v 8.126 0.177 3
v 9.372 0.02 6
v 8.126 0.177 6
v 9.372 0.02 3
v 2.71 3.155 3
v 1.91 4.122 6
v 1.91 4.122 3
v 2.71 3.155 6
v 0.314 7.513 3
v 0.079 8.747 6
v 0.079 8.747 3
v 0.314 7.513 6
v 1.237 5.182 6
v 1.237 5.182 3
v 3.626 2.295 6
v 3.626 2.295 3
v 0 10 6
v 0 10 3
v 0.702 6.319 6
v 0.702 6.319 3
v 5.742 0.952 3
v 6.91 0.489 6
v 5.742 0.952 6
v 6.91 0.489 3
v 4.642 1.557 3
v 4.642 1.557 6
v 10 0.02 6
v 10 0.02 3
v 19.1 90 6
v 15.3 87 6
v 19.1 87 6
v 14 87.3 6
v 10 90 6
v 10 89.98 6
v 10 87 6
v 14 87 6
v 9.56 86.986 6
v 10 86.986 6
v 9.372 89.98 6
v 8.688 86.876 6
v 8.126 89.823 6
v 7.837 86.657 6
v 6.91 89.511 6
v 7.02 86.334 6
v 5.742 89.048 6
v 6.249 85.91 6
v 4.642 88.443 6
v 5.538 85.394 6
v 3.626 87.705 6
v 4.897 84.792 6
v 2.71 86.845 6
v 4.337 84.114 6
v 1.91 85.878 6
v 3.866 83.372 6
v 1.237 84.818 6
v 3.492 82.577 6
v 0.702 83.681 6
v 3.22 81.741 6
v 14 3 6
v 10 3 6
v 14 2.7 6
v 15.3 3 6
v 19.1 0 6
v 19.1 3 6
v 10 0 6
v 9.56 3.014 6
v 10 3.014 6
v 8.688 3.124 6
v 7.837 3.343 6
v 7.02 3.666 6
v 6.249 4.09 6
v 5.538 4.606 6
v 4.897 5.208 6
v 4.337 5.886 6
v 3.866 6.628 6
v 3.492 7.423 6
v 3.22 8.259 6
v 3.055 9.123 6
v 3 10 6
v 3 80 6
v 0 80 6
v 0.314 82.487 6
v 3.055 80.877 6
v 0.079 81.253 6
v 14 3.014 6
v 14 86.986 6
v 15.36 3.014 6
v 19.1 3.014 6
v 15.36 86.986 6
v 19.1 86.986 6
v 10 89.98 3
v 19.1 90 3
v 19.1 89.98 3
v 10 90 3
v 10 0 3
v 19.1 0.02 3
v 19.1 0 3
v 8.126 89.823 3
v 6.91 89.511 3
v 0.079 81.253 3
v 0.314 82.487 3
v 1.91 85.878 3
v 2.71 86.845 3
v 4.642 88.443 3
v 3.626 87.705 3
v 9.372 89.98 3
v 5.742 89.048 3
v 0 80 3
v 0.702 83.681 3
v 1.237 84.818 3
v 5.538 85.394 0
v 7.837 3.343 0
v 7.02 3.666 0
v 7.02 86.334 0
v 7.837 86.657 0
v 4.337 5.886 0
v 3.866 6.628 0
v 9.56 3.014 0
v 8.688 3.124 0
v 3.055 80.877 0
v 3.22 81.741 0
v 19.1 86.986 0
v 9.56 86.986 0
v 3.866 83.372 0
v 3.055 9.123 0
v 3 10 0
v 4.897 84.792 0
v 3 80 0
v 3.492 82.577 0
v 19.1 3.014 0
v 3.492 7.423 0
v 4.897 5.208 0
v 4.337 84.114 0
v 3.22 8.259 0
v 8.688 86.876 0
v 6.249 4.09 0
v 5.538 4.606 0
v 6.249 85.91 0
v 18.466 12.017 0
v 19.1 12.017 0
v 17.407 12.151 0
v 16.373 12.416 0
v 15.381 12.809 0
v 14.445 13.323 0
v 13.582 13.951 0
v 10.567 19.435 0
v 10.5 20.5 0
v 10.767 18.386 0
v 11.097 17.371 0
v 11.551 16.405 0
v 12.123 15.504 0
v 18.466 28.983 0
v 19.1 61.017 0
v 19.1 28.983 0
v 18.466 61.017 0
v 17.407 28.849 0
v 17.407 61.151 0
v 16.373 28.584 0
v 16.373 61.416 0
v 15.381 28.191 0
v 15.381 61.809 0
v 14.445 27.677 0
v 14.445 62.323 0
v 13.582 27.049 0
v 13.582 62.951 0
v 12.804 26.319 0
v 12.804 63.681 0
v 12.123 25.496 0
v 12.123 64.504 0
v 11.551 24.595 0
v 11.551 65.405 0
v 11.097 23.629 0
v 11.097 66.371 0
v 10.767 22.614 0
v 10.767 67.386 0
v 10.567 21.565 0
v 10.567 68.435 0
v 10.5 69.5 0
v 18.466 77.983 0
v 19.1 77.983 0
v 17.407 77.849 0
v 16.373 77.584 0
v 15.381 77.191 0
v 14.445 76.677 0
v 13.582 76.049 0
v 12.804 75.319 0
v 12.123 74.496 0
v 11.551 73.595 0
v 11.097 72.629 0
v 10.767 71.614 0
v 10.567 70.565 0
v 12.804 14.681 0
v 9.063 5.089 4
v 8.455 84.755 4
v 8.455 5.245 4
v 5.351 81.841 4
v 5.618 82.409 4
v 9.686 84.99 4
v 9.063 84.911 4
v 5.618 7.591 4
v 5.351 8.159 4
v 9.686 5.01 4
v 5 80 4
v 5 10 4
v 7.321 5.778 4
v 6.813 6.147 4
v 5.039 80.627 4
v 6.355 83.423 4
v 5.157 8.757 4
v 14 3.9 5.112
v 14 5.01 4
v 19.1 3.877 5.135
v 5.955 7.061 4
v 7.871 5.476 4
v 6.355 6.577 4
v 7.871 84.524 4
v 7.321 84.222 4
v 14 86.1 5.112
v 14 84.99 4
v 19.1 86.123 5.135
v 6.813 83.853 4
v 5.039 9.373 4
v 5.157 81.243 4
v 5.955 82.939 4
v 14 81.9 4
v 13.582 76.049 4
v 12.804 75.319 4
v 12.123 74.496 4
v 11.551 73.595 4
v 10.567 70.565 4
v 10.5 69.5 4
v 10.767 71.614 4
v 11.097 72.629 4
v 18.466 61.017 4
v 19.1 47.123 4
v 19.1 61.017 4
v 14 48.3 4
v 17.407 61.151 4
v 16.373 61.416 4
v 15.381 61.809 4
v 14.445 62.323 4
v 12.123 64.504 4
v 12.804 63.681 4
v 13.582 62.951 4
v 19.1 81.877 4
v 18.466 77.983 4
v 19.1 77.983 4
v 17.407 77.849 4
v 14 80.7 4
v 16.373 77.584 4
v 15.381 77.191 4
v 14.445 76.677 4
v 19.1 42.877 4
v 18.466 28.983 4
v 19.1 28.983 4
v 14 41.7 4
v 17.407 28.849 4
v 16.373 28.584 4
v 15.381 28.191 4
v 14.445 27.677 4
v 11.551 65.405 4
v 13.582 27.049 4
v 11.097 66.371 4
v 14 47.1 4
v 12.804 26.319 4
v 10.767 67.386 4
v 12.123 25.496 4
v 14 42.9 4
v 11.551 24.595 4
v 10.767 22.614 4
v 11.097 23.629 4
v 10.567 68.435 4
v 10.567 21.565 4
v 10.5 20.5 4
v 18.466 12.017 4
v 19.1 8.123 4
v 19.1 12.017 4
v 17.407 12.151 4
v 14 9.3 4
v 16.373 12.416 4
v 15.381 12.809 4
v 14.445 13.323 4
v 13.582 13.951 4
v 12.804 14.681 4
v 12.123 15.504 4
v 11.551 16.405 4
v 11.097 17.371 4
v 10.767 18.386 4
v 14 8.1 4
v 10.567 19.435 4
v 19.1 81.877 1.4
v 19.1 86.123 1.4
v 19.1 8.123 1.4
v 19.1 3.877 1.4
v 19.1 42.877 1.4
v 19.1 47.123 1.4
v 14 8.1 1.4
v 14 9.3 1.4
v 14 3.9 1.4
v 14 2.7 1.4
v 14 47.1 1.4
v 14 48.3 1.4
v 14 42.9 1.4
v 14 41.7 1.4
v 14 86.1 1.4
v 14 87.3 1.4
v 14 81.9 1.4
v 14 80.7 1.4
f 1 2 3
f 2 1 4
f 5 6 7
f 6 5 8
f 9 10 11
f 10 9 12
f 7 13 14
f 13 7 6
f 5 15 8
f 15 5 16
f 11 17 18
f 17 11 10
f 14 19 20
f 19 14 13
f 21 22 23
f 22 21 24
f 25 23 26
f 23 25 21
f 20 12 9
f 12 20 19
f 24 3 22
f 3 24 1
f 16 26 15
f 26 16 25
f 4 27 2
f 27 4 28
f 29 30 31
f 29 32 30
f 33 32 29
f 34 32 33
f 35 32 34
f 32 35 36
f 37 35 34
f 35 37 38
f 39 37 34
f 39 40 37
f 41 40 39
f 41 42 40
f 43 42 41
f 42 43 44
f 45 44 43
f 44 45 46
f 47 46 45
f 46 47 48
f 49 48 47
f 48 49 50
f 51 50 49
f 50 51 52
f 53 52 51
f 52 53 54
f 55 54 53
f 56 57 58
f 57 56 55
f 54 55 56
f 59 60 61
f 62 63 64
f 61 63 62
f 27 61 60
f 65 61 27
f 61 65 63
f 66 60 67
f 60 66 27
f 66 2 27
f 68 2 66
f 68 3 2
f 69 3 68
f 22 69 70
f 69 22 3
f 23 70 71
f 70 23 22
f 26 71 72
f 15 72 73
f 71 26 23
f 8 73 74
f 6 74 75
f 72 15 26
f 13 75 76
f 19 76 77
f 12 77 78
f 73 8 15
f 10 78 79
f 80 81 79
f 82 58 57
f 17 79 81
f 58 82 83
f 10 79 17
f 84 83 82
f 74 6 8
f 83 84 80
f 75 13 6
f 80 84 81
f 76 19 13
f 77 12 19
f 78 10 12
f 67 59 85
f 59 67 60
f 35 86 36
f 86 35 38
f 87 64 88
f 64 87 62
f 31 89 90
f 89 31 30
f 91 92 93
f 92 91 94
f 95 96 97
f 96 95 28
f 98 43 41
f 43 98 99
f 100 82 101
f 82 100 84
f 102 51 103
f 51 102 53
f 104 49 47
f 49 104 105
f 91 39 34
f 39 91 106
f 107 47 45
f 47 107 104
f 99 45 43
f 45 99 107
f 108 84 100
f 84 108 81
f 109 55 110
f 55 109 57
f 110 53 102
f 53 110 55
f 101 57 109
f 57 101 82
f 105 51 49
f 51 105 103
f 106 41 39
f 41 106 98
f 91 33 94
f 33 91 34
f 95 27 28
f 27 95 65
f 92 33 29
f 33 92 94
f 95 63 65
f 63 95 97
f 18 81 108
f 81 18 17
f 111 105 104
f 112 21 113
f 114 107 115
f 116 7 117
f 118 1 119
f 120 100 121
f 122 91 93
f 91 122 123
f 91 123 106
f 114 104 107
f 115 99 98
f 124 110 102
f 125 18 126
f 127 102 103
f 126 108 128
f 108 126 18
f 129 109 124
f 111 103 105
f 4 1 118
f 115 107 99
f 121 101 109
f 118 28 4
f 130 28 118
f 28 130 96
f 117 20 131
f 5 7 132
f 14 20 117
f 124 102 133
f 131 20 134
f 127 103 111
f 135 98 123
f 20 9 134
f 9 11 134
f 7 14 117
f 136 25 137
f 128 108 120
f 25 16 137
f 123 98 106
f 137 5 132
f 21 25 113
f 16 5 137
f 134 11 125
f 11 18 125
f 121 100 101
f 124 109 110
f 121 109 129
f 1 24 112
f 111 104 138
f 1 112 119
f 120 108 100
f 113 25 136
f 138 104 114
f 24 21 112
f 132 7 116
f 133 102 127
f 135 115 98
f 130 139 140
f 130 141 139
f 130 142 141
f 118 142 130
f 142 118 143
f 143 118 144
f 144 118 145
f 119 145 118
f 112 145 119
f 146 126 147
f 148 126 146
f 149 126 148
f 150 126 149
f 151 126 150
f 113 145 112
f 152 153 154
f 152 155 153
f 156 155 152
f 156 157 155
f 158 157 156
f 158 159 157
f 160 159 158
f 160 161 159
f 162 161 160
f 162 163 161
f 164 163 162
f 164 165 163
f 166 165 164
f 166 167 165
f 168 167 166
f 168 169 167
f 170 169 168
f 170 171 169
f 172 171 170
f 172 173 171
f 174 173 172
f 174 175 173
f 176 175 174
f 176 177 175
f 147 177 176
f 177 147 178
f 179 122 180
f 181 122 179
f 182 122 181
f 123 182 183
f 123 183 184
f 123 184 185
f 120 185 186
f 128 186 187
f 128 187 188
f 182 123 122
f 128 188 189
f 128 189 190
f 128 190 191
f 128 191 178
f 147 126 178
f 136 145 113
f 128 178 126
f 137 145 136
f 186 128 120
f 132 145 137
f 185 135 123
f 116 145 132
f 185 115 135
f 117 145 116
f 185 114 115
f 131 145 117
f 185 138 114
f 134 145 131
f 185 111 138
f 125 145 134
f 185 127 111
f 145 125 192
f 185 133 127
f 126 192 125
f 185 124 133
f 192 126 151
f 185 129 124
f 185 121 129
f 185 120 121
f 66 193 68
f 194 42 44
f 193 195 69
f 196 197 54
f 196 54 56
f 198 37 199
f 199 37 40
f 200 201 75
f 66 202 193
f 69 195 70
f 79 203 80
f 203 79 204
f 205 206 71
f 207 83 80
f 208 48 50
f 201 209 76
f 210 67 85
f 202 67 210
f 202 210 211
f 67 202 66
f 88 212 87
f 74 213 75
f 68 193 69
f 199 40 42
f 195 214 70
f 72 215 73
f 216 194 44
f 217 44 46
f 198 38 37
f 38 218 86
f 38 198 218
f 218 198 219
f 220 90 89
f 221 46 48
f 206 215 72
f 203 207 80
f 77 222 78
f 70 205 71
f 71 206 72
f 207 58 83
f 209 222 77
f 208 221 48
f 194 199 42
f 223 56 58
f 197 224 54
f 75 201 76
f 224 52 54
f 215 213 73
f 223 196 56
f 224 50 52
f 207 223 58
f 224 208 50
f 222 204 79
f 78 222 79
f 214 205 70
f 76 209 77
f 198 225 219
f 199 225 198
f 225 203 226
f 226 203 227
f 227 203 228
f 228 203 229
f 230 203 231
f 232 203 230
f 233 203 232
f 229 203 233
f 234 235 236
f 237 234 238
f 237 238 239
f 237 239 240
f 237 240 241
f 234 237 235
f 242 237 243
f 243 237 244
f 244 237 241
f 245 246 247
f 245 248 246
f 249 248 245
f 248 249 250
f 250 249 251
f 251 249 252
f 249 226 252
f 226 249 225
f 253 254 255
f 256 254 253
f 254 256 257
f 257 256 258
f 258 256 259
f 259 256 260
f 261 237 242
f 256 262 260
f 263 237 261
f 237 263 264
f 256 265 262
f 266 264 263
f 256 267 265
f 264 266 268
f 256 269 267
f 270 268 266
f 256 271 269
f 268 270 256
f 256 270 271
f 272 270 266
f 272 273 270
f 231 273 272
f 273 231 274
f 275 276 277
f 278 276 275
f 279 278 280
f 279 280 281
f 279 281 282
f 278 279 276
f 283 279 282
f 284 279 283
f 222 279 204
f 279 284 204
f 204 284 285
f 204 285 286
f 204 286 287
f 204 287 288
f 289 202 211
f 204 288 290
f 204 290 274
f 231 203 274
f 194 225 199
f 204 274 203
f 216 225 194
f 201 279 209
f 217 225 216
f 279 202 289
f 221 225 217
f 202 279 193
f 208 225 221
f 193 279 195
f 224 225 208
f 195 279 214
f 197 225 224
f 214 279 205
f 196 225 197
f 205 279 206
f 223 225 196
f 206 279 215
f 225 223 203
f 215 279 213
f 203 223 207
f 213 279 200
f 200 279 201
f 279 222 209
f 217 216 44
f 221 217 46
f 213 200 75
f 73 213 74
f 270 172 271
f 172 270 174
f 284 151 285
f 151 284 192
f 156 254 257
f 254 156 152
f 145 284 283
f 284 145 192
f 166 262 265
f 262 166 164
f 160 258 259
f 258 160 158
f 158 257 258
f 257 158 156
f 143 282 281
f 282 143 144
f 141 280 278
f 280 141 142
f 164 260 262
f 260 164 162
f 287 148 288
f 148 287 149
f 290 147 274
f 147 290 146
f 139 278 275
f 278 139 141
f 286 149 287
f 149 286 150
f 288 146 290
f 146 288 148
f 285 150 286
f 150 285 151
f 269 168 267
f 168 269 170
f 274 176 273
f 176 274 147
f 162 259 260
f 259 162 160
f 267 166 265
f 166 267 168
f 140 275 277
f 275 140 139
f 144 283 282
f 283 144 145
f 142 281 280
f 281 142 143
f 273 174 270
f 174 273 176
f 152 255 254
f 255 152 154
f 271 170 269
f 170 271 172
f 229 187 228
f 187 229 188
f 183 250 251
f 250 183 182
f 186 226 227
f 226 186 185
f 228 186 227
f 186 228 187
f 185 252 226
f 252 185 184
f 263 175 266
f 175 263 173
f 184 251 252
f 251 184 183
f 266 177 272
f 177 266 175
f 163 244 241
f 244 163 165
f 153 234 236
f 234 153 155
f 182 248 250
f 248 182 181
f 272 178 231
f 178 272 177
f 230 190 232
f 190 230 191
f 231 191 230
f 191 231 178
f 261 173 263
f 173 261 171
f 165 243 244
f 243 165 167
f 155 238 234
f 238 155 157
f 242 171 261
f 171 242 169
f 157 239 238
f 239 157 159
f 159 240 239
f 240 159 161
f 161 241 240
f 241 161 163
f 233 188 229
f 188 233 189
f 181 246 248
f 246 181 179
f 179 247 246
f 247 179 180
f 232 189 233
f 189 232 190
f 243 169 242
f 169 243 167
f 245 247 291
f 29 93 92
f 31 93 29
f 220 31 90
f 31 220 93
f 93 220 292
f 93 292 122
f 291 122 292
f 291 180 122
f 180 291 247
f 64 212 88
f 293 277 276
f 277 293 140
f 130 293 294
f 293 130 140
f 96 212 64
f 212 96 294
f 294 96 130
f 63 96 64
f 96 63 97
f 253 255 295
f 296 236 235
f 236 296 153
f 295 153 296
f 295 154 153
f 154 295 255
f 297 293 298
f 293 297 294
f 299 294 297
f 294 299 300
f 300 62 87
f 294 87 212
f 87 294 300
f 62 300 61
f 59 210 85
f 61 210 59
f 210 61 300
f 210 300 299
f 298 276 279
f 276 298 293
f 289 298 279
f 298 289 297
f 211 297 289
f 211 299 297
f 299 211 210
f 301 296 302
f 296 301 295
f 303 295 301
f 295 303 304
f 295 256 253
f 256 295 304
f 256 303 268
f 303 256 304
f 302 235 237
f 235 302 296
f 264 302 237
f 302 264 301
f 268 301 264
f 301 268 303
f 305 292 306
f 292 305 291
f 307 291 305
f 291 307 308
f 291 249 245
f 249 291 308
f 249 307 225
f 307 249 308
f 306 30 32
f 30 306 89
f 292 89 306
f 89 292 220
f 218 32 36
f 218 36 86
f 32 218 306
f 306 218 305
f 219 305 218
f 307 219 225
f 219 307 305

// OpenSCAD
// file: kitchen_config.scad
use <./_cfg.scad>

// Kitchen Configuration Functions
function get_h() = 6;
function get_width() = 38;
function get_length() = 90;
function get_diameter() = 17;
function get_distance() = 49;
function get_nutDistance() = 6;
function get_separation() = 10;
// file: _cfg.scad
// Global configuration functions
function get_fn() = 50;
function get_darft() = false;
// file: base.scad
module base(h, width, length, diameter, distance, fn) {
//    diameter=17;
//    distance=52;

    corner_radius=10;

    difference() {
        union() {
            difference() {
                _base_plate_shape(corner_radius, h, width, length, fn);
                translate([3,3,h-2]) {
                    offset=3;
                    _base_plate_shape(corner_radius-offset, h-2, width-offset*2, length-offset*2, fn);
                }
            }
        }

        translate([width/2, length/2-distance/2, -.1]) {
            cylinder(d=diameter, h=h+.2, center=false, $fn=fn);
            translate([0, distance, 0]) {
                cylinder(d=diameter, h=h+.2, center=false, $fn=fn);
            }
        }
    }
}

module rounded_top_only(corner_radius, h, width, length, fn) {
    minkowski() {
        _base_plate_shape(corner_radius, h - corner_radius, width, length, fn);
        translate([0, 0, corner_radius]) cylinder(r=corner_radius/2, h=0.001, $fn=fn);
    }
}

module _base_plate_shape(corner_radius, h, width, length, fn) {
    hs=h/2;
    hn=h-hs;

    translate([0, 0, hs])

    union() {
        translate([corner_radius, 0, 0])
            cube([width - corner_radius * 2, length, hn], center=false);

        translate([0, corner_radius, 0])
            cube([width, length - corner_radius * 2, hn], center=false);

        for (x = [corner_radius, width - corner_radius])
        for (y = [corner_radius, length - corner_radius])
        translate([x, y, 0])
            cylinder(d = corner_radius * 2, h = hn, center = false, $fn = fn);

        // -------

        hull() {
            for (x = [corner_radius, width - corner_radius])
            for (y = [corner_radius, length - corner_radius])
            translate([x, y, 0])
                translate([0, 0, -hs])
                    cylinder(r1=corner_radius-hs, r2=corner_radius, h = hs, center = false, $fn = fn);
        }
    }
}

module nut(h,extend=0) {
    nut_height=h;
    nut_width=5+extend;
    nut_length=4+extend;
    nut_length_=1+extend;
    rotate([0,0,90]) {
        translate([-nut_length/2,0,0]) {
            linear_extrude(height=nut_height)
                polygon(points=[[0,0], [-nut_length_,nut_width], [0,nut_width]]);

            translate([nut_length,0,0]) {
                linear_extrude(height=nut_height)
                    polygon(points=[[0,0], [nut_length_,nut_width], [0,nut_width]]);
            }

            cube([nut_length, nut_width, nut_height], center=false);
        }
    }
}

module both(h, width, length, diameter, distance, nutDistance, separation, fn) {
    left(h, width, length, diameter, distance, nutDistance, fn);

    translate([-separation, 0, 0])
        right(h, width, length, diameter, distance, nutDistance, fn);
}

module left(h, width, length, diameter, distance, nutDistance, fn) {
    union() {
        translate([0, 0, 0]) {
            difference() {
                base(h, width, length, diameter, distance, fn);
                translate([-.1, -.1, -.1]) {
                    cube([width / 2, length + .2, h + .2], center = false);
                }
            }
        }

        translate([0.2,0,2])
            translate([width / 2, 0, 0]) {
                translate([0, nutDistance, 0]) {
                    nut(h - 4);
                }
                translate([0, length / 2, 0]) {
                    nut(h - 4);
                }
                translate([0, length - nutDistance, 0]) {
                    nut(h - 4);
                }
            }
    }
}

module right(h, width, length, diameter, distance, nutDistance, fn) {
    difference() {
        union() {
            difference() {
                base(h, width, length, diameter, distance, fn);
                translate([width / 2 + .1, -.1, -.1]) {
                    cube([width / 2, length + .2, h + .2], center = false);
                }
            }
        }

        translate([0.2,0,1.5])
            translate([width / 2 , 0, -.1]) {
                translate([0, nutDistance, 0]) {
                    nut(h - 1.3, extend = .2);
                }
                translate([0, length / 2, 0]) {
                    nut(h - 1.3, extend = .2);
                }
                translate([0, length - nutDistance, 0]) {
                    nut(h - 1.3, extend =  .2);
                }
            }
    }
}
// main file
use <./base.scad>
use <./_cfg.scad>
use <./kitchen_config.scad>

right(get_h(), get_width(), get_length(), get_diameter(), get_distance(), get_nutDistance(), get_fn());
